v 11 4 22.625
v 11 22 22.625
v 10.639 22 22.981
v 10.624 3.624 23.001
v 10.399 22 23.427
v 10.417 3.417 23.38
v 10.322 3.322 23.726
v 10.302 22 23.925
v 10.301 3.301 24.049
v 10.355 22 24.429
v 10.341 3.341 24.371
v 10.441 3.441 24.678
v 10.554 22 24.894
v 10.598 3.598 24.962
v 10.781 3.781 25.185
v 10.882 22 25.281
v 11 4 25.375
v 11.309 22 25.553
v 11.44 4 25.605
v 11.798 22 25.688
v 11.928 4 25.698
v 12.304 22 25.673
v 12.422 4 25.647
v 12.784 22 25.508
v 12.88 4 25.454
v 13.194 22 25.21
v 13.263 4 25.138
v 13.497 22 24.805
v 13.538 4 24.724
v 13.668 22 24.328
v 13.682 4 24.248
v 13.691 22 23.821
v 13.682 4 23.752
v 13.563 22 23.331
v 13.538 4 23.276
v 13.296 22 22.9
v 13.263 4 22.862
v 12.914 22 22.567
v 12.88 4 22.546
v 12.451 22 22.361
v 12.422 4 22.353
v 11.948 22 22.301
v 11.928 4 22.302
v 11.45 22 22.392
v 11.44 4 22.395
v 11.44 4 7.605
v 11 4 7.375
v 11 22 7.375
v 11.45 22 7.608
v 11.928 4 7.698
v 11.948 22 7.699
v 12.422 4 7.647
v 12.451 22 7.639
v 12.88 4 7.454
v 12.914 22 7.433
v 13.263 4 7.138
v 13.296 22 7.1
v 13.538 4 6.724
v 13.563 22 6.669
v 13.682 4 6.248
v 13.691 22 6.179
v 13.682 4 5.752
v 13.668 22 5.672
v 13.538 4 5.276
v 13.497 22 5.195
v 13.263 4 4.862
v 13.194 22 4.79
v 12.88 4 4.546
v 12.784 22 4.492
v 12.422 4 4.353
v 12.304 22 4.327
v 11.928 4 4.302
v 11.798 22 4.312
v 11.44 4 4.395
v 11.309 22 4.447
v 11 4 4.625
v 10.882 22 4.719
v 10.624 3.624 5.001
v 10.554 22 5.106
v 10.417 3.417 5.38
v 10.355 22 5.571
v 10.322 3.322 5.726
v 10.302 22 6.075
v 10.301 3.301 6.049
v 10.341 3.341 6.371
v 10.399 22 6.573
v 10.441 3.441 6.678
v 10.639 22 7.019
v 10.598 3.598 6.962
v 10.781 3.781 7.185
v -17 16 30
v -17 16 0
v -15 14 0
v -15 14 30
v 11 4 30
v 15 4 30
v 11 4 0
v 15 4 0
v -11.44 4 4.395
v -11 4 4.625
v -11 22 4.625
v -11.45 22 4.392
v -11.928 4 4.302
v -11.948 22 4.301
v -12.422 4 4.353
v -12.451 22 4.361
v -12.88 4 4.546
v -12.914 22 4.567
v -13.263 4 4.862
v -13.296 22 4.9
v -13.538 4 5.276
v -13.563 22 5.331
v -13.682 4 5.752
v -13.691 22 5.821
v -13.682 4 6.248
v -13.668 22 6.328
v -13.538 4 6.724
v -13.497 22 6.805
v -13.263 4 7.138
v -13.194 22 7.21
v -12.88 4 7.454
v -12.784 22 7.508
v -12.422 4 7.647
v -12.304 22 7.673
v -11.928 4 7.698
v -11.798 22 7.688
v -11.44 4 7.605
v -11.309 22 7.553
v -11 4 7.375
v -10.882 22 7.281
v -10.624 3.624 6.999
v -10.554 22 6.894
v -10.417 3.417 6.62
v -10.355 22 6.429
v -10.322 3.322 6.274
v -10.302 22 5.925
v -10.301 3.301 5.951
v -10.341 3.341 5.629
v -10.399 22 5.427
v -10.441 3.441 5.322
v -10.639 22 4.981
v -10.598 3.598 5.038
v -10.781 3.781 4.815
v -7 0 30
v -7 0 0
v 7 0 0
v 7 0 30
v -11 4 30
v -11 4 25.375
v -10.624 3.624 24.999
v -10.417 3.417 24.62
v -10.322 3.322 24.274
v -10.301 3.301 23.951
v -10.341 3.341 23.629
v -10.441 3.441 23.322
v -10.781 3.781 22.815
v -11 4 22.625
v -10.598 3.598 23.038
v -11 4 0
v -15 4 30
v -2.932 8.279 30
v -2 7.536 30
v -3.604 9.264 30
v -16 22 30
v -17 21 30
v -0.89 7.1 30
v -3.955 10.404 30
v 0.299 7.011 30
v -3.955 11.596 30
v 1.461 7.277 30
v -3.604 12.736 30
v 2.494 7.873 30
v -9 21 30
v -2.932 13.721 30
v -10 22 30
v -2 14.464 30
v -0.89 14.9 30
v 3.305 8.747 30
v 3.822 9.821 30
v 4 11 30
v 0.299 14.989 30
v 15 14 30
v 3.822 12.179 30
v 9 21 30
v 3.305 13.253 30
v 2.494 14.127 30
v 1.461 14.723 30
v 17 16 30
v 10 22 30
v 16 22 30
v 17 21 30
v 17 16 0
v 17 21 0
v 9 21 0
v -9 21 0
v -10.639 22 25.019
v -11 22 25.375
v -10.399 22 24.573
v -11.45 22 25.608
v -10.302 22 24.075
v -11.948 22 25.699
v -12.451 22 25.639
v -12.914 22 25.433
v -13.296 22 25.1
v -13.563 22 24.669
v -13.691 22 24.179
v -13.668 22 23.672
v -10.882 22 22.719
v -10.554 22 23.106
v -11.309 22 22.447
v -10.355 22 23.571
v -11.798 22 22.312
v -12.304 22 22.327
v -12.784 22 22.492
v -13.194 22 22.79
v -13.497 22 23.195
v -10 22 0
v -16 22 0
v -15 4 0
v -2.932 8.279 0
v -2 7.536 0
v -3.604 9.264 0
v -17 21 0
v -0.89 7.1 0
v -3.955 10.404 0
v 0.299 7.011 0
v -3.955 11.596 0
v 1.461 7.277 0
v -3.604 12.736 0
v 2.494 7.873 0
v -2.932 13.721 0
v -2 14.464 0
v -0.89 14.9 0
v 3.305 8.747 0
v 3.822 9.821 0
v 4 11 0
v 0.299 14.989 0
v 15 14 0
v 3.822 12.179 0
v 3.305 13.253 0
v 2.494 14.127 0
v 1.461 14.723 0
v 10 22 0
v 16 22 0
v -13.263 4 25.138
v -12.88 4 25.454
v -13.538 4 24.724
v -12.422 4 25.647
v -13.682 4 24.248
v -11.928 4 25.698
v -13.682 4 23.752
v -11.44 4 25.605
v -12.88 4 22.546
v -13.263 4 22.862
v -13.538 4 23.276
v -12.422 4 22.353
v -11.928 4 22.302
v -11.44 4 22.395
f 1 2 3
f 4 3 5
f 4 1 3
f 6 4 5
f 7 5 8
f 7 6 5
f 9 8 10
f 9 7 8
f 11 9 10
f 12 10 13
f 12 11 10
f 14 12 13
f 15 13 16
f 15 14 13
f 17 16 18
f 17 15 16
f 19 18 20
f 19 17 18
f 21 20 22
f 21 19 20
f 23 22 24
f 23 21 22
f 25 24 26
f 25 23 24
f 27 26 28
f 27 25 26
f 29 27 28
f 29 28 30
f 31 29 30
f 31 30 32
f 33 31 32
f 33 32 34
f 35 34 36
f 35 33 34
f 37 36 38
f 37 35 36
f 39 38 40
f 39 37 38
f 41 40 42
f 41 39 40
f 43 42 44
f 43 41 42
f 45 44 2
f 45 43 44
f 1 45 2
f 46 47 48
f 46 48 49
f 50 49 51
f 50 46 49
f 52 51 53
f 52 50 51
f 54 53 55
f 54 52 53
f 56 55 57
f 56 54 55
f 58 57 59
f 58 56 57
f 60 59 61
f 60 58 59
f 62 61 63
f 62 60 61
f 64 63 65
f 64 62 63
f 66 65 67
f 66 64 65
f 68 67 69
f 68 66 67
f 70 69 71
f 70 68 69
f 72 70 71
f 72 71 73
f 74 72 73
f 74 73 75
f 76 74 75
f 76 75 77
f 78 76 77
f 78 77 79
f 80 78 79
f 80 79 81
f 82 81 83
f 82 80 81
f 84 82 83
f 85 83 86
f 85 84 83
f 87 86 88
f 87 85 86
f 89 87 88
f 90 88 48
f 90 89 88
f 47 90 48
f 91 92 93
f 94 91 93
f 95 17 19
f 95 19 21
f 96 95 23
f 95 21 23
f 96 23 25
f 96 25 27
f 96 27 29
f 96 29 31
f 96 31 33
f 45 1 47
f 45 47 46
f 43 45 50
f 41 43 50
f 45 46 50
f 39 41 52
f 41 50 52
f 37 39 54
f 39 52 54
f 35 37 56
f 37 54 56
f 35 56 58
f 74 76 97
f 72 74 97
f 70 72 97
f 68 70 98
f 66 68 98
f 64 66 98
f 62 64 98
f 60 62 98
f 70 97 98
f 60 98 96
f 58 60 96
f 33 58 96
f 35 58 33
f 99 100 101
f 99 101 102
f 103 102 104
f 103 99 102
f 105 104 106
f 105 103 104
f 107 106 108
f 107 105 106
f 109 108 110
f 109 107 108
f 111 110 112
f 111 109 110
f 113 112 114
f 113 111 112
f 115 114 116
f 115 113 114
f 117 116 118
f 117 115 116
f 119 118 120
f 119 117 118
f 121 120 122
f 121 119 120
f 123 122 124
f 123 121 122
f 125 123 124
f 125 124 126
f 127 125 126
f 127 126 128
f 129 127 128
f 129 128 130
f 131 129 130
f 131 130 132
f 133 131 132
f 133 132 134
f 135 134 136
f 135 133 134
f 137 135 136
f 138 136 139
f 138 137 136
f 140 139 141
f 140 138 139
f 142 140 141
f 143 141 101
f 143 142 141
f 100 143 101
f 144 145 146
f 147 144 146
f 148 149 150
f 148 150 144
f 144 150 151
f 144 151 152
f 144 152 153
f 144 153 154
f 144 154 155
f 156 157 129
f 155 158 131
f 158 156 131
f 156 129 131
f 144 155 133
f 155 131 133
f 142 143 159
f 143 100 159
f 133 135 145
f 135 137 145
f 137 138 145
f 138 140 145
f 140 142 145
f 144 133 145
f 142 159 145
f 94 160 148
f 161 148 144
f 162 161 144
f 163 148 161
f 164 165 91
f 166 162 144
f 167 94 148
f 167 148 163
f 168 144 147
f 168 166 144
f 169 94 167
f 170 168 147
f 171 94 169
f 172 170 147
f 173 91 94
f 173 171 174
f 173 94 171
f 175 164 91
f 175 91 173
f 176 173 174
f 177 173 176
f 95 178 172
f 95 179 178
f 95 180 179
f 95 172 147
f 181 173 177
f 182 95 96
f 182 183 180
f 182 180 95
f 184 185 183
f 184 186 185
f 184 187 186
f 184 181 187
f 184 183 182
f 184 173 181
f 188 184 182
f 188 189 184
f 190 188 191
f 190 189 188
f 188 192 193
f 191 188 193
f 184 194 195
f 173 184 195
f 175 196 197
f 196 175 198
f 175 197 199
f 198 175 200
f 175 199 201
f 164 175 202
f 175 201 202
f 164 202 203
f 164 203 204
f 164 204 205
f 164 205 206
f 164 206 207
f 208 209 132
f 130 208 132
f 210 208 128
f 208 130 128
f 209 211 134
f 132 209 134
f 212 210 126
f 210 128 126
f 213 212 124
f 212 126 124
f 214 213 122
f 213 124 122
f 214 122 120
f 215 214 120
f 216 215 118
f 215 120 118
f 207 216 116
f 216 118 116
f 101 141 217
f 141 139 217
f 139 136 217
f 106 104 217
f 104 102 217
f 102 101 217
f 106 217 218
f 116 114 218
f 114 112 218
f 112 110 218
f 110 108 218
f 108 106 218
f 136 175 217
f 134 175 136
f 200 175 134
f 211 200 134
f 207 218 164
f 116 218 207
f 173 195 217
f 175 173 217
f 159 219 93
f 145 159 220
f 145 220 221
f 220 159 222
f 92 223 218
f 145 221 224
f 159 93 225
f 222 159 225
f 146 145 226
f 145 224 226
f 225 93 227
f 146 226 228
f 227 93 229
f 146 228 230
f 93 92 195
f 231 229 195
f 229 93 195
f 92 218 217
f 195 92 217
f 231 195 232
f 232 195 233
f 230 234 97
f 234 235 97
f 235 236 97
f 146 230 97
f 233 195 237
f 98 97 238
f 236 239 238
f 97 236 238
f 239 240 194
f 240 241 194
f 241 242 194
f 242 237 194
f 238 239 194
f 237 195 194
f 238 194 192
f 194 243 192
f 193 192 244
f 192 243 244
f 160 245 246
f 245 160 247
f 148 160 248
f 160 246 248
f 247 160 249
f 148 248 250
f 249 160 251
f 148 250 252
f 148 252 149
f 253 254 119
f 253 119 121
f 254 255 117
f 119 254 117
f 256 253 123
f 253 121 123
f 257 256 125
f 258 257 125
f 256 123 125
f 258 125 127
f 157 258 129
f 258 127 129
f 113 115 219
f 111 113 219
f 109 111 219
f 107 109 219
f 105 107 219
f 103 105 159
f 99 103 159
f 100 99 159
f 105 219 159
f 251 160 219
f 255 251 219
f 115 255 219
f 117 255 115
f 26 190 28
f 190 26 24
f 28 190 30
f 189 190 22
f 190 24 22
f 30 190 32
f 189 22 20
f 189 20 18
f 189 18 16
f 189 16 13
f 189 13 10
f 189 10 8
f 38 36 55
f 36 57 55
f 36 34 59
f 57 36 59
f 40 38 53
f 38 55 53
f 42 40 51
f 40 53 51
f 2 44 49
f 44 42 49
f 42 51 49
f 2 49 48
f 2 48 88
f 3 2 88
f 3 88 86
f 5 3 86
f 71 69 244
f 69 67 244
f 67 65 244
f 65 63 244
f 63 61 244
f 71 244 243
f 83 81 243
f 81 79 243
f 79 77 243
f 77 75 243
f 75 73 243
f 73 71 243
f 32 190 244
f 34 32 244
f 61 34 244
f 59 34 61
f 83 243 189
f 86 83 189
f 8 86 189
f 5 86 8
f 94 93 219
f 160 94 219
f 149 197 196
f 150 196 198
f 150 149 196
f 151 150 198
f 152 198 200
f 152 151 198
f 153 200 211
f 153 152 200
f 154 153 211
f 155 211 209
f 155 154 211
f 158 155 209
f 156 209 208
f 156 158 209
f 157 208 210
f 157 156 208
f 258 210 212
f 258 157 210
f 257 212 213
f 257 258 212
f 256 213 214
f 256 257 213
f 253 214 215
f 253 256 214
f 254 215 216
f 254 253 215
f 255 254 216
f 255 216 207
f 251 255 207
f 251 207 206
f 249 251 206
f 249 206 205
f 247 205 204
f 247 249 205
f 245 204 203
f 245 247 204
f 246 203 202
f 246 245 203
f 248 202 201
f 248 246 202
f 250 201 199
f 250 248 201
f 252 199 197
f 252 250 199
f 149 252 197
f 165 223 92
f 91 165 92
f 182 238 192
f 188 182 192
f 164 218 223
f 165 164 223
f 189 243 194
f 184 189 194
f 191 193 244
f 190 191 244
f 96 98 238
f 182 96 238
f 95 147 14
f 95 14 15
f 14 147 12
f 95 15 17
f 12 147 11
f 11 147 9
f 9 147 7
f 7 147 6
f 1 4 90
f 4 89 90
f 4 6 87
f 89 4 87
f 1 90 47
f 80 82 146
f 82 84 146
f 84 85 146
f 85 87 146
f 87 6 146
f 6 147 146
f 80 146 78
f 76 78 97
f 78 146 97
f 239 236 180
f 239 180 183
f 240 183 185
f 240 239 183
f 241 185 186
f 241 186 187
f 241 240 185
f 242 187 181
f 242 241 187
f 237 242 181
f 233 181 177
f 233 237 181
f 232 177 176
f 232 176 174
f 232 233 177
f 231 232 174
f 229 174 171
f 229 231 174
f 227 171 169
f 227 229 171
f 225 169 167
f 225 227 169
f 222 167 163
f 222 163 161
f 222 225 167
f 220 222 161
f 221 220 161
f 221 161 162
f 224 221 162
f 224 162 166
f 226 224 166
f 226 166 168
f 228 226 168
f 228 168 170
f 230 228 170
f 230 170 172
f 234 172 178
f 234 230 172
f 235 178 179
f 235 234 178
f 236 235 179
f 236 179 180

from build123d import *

# Parameters (mm, degrees)
BOSS_EXTRUDE1_OUTLINE_R = 4
BOSS_EXTRUDE1_DEPTH     = 30
CUT_EXTRUDE1_DEPTH      = 41.902322672
CUT_EXTRUDE1_DEPTH_BACK = 41.902322672
SKETCH2_R               = 1.7


# Read off the part's stored shape, not the designer's step: Boss-Extrude1
with BuildPart() as part:
    # Boss-Extrude1 outline → Boss-Extrude1 (new body)
    with BuildSketch(Plane.XY):
        Polygon((7, 0), (11, 4), (15, 4), (15, 14), (17, 16), (17, 21), (16, 22), (10, 22), (9, 21), (-9, 21), (-10, 22), (-16, 22), (-17, 21), (-17, 16), (-15, 14), (-15, 4), (-11, 4), (-7, 0), align=None)
        with Locations((0, 11)):
            Circle(BOSS_EXTRUDE1_OUTLINE_R, mode=Mode.SUBTRACT)
    extrude(amount=BOSS_EXTRUDE1_DEPTH)

    # Sketch2 → Cut-Extrude1 (cut, two sides: drawn at the far end of the back side and taken through both)
    with BuildSketch(Plane(origin=(0, 22, 0), x_dir=(1, 0, 0), z_dir=(0, 1, 0)).offset(-CUT_EXTRUDE1_DEPTH_BACK)):
        with Locations(Location((12, -6, 0), (0, 0, 233.968120928))):
            Circle(SKETCH2_R)
        with Locations(Location((-12, -6, 0), (0, 0, 53.968120928))):
            Circle(SKETCH2_R)
        with Locations(Location((12, -24, 0), (0, 0, 126.031879072))):
            Circle(SKETCH2_R)
        with Locations(Location((-12, -24, 0), (0, 0, 306.031879072))):
            Circle(SKETCH2_R)
    extrude(amount=CUT_EXTRUDE1_DEPTH + CUT_EXTRUDE1_DEPTH_BACK, mode=Mode.SUBTRACT)


solid = part.part
